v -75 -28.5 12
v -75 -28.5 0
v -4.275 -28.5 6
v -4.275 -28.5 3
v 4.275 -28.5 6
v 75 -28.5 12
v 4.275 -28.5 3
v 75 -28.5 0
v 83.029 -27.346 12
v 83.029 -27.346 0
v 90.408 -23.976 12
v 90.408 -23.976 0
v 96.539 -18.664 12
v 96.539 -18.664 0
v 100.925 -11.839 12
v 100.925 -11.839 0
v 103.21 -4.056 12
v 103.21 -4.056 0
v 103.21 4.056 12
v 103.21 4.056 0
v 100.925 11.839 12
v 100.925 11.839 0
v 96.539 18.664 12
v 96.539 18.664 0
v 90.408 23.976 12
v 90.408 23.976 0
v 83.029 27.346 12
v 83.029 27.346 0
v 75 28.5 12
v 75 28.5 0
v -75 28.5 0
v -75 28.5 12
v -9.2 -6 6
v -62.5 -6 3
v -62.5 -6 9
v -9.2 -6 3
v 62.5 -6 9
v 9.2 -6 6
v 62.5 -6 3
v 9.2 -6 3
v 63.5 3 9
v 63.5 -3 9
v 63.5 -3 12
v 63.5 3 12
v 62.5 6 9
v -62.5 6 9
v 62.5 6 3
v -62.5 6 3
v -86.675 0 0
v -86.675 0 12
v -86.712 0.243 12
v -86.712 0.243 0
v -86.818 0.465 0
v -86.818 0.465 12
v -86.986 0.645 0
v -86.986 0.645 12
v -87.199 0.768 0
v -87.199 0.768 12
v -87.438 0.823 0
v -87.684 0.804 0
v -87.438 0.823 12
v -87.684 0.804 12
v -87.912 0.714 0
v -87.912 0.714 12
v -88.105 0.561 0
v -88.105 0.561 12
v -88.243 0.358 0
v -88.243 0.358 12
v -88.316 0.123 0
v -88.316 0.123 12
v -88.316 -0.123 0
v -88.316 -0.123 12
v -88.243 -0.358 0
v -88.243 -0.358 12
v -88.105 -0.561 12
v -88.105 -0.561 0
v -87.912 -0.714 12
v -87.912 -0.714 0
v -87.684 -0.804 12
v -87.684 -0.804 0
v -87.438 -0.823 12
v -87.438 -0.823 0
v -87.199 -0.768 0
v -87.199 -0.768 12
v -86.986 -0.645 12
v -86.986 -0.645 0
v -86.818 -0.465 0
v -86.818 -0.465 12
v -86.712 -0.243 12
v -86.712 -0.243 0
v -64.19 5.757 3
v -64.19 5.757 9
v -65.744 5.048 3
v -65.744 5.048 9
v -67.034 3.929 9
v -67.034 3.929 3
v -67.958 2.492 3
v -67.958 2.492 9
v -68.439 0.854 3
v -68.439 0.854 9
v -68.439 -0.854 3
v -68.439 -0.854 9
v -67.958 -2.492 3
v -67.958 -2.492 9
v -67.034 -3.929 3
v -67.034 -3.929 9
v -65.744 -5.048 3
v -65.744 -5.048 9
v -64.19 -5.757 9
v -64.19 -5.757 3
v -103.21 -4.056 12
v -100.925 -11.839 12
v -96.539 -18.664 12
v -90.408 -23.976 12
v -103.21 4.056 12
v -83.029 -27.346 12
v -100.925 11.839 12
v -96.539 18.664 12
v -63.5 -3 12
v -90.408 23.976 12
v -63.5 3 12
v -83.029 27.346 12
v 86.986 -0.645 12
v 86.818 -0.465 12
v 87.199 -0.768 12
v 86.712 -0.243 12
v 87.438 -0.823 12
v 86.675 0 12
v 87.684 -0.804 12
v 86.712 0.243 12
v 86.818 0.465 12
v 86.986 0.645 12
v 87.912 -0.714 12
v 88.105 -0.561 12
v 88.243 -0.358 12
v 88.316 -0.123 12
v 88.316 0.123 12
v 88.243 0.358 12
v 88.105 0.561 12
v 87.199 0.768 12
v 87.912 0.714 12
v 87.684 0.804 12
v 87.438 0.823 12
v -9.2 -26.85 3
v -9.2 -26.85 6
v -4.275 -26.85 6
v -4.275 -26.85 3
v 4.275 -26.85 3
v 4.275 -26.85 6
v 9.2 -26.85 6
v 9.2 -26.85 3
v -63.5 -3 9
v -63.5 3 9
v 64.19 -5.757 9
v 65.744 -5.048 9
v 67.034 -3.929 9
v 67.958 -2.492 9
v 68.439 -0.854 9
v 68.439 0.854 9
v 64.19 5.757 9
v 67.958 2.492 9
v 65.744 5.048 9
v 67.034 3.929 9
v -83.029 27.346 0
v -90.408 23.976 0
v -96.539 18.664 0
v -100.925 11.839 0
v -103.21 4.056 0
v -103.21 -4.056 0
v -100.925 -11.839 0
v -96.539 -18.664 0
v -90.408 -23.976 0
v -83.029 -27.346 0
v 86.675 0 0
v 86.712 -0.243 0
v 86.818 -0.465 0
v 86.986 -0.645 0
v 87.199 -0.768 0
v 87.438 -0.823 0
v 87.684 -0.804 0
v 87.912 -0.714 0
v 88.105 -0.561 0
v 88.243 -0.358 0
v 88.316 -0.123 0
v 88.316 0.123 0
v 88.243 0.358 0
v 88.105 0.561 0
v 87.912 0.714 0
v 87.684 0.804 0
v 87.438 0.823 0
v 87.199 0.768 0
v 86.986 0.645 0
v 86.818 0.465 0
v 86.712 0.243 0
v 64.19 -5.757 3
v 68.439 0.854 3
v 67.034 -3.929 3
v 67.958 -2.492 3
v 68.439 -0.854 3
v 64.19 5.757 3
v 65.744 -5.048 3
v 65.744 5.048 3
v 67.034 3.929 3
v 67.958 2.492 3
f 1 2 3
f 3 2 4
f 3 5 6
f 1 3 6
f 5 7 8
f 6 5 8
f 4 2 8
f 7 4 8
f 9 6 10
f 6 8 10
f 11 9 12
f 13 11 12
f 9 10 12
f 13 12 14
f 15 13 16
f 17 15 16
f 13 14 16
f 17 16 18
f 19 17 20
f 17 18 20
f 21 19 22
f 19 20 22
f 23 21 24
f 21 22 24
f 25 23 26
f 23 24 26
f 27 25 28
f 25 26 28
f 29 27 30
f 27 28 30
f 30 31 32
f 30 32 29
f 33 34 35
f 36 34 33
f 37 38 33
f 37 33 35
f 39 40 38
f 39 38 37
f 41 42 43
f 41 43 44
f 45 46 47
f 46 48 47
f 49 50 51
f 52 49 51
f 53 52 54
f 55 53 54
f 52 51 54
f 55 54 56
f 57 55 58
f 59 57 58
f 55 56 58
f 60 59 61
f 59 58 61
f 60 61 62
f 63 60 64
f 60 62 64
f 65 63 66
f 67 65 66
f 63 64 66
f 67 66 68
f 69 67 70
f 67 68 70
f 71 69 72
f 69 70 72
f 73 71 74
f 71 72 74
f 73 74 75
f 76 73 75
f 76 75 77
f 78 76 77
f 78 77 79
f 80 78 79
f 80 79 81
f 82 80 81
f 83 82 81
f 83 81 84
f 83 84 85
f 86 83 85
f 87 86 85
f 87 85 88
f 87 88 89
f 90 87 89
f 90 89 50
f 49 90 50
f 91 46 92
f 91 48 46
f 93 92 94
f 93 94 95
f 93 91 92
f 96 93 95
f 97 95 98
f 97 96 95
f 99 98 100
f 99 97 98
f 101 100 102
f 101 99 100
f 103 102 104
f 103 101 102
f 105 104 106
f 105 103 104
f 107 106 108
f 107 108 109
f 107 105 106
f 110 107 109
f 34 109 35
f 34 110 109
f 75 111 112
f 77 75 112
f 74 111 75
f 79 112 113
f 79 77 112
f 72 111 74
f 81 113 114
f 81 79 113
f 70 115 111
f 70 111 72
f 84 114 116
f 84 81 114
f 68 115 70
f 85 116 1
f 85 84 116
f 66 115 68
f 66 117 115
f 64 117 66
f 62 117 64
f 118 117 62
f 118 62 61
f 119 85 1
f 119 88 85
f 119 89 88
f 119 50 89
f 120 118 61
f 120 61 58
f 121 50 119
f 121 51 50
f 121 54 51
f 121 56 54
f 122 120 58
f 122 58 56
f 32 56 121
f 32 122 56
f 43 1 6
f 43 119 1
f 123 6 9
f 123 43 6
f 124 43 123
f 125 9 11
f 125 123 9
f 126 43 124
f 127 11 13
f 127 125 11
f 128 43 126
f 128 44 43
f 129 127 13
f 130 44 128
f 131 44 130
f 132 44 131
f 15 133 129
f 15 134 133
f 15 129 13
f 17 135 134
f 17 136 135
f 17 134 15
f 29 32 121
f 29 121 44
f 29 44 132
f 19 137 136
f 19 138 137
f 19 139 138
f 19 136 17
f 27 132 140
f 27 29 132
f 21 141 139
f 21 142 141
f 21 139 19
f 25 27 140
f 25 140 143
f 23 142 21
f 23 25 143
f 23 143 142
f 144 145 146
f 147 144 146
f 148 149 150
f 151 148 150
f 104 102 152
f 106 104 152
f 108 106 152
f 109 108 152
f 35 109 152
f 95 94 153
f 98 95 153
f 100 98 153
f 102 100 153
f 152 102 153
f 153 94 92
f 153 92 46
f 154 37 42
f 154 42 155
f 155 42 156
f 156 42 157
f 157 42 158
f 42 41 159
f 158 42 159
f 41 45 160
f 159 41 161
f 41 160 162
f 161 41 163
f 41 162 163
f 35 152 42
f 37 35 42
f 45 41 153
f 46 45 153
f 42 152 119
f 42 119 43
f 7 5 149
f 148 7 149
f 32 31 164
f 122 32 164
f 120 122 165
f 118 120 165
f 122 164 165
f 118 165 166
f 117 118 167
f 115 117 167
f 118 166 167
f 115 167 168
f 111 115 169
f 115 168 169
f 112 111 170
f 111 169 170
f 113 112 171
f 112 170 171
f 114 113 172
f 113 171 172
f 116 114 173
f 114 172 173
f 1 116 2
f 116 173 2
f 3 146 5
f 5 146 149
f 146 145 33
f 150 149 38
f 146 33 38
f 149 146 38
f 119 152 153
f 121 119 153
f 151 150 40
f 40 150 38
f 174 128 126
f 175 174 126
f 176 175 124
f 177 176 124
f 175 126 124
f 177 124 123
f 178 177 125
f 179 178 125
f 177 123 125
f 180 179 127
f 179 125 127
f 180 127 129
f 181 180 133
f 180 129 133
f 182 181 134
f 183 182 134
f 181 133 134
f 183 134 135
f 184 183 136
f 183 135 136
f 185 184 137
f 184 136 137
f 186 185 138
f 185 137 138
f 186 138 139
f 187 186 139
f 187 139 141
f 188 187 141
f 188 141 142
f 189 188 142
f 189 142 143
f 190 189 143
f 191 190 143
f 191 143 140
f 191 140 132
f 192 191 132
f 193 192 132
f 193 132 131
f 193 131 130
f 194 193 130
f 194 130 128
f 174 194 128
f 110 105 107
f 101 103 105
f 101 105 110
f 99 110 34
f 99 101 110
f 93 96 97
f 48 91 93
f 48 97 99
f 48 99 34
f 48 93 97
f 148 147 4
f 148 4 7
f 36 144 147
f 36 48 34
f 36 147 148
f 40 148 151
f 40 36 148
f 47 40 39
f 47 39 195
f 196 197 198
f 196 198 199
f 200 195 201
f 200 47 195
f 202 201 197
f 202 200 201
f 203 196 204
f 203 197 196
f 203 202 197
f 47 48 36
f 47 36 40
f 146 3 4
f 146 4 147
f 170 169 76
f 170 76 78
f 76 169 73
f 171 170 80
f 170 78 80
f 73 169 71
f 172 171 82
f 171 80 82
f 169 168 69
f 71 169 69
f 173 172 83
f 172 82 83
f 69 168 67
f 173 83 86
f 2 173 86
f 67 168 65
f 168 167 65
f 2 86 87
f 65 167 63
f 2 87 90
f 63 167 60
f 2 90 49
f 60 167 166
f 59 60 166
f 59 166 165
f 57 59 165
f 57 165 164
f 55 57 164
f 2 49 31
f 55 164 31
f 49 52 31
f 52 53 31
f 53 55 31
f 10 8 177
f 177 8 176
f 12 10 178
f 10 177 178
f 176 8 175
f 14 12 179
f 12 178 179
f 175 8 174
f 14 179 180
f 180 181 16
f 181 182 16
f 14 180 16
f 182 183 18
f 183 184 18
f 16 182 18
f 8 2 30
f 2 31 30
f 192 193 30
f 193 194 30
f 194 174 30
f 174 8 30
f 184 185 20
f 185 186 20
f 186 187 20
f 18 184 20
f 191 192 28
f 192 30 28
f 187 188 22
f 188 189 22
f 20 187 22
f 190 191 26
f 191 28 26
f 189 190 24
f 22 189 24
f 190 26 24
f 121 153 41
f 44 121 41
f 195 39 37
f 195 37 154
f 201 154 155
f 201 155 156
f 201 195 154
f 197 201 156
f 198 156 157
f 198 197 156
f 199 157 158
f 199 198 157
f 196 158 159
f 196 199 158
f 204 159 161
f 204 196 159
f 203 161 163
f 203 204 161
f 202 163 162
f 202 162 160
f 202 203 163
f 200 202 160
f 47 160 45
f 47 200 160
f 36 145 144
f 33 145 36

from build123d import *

# Parameters (mm, degrees)
PAD_DEPTH          = 6
POCKET_DEPTH       = 3
SKETCH002_W        = 18.4
SKETCH002_H        = 20.85
POCKET001_DEPTH    = 3
SKETCH003_W        = 8.55
SKETCH003_H        = 1.65
POCKET002_DEPTH    = 3
PAD001_DEPTH       = 3
SKETCH005_W        = 127
SKETCH005_H        = 6
PAD002_DEPTH       = 3
SKETCH006_R        = 0.825
POCKET003_DEPTH    = 442.080062
POLARPATTERN_COUNT = 2


with BuildPart() as part:
    # Sketch → Pad (new body)
    with BuildSketch(Plane.XY):
        with BuildLine():
            ThreePointArc((-75, 28.5), (-103.5, 0), (-75, -28.5))
            Line((-75, -28.5), (75, -28.5))
            ThreePointArc((75, -28.5), (103.5, 0), (75, 28.5))
            Line((-75, 28.5), (75, 28.5))
        make_face()
    extrude(amount=PAD_DEPTH)

    # Sketch001 (on Face6 of Pad) → Pocket (cut)
    with BuildSketch(Plane.XY.offset(6)):
        with BuildLine():
            ThreePointArc((-62.5, 6), (-68.5, 0), (-62.5, -6))
            Line((-62.5, -6), (62.5, -6))
            ThreePointArc((62.5, -6), (68.5, 0), (62.5, 6))
            Line((-62.5, 6), (62.5, 6))
        make_face()
    extrude(amount=-POCKET_DEPTH, mode=Mode.SUBTRACT)

    # Sketch002 (on Face5 of Pocket) → Pocket001 (cut)
    with BuildSketch(Plane.XY.offset(6)):
        with Locations((0, -16.425)):
            Rectangle(SKETCH002_W, SKETCH002_H)
    extrude(amount=-POCKET001_DEPTH, mode=Mode.SUBTRACT)

    # Sketch003 (on Face5 of Pocket001) → Pocket002 (cut)
    with BuildSketch(Plane.XY.offset(6)):
        with Locations((0, -27.675)):
            Rectangle(SKETCH003_W, SKETCH003_H)
    extrude(amount=-POCKET002_DEPTH, mode=Mode.SUBTRACT)

    # Sketch004 (on Face5 of Pocket002) → Pad001 (join)
    with BuildSketch(Plane.XY.offset(6)):
        with BuildLine():
            ThreePointArc((-75, 28.5), (-103.5, 0), (-75, -28.5))
            Line((-75, -28.5), (75, -28.5))
            ThreePointArc((75, -28.5), (103.5, 0), (75, 28.5))
            Line((-75, 28.5), (75, 28.5))
        make_face()
        with BuildLine():
            ThreePointArc((-62.5, 6), (-68.5, 0), (-62.5, -6))
            Line((-62.5, -6), (62.5, -6))
            ThreePointArc((62.5, -6), (68.5, 0), (62.5, 6))
            Line((-62.5, 6), (62.5, 6))
        make_face(mode=Mode.SUBTRACT)
    extrude(amount=PAD001_DEPTH)

    # Sketch005 (on Face12 of Pad001) → Pad002 (join)
    with BuildSketch(Plane.XY.offset(9)):
        with BuildLine():
            ThreePointArc((-75, 28.5), (-103.5, 0), (-75, -28.5))
            Line((-75, -28.5), (75, -28.5))
            ThreePointArc((75, -28.5), (103.5, 0), (75, 28.5))
            Line((-75, 28.5), (75, 28.5))
        make_face()
        Rectangle(SKETCH005_W, SKETCH005_H, mode=Mode.SUBTRACT)
    extrude(amount=PAD002_DEPTH)

    # Sketch006 (on Face20 of Pad002) → Pocket003 (cut, through all)
    with BuildSketch(Plane.XY.offset(12)):
        with Locations((-87.5, 0)):
            Circle(SKETCH006_R)
    pocket003 = extrude(amount=-POCKET003_DEPTH, mode=Mode.SUBTRACT)

    # PolarPattern: Pocket003 ×2 about axis
    polarpattern_axis = Axis((0, 0, 12), (0, 0, 1))
    for i in range(1, POLARPATTERN_COUNT):
        add(pocket003.rotate(polarpattern_axis, i * 360 / POLARPATTERN_COUNT), mode=Mode.SUBTRACT)


solid = part.part
